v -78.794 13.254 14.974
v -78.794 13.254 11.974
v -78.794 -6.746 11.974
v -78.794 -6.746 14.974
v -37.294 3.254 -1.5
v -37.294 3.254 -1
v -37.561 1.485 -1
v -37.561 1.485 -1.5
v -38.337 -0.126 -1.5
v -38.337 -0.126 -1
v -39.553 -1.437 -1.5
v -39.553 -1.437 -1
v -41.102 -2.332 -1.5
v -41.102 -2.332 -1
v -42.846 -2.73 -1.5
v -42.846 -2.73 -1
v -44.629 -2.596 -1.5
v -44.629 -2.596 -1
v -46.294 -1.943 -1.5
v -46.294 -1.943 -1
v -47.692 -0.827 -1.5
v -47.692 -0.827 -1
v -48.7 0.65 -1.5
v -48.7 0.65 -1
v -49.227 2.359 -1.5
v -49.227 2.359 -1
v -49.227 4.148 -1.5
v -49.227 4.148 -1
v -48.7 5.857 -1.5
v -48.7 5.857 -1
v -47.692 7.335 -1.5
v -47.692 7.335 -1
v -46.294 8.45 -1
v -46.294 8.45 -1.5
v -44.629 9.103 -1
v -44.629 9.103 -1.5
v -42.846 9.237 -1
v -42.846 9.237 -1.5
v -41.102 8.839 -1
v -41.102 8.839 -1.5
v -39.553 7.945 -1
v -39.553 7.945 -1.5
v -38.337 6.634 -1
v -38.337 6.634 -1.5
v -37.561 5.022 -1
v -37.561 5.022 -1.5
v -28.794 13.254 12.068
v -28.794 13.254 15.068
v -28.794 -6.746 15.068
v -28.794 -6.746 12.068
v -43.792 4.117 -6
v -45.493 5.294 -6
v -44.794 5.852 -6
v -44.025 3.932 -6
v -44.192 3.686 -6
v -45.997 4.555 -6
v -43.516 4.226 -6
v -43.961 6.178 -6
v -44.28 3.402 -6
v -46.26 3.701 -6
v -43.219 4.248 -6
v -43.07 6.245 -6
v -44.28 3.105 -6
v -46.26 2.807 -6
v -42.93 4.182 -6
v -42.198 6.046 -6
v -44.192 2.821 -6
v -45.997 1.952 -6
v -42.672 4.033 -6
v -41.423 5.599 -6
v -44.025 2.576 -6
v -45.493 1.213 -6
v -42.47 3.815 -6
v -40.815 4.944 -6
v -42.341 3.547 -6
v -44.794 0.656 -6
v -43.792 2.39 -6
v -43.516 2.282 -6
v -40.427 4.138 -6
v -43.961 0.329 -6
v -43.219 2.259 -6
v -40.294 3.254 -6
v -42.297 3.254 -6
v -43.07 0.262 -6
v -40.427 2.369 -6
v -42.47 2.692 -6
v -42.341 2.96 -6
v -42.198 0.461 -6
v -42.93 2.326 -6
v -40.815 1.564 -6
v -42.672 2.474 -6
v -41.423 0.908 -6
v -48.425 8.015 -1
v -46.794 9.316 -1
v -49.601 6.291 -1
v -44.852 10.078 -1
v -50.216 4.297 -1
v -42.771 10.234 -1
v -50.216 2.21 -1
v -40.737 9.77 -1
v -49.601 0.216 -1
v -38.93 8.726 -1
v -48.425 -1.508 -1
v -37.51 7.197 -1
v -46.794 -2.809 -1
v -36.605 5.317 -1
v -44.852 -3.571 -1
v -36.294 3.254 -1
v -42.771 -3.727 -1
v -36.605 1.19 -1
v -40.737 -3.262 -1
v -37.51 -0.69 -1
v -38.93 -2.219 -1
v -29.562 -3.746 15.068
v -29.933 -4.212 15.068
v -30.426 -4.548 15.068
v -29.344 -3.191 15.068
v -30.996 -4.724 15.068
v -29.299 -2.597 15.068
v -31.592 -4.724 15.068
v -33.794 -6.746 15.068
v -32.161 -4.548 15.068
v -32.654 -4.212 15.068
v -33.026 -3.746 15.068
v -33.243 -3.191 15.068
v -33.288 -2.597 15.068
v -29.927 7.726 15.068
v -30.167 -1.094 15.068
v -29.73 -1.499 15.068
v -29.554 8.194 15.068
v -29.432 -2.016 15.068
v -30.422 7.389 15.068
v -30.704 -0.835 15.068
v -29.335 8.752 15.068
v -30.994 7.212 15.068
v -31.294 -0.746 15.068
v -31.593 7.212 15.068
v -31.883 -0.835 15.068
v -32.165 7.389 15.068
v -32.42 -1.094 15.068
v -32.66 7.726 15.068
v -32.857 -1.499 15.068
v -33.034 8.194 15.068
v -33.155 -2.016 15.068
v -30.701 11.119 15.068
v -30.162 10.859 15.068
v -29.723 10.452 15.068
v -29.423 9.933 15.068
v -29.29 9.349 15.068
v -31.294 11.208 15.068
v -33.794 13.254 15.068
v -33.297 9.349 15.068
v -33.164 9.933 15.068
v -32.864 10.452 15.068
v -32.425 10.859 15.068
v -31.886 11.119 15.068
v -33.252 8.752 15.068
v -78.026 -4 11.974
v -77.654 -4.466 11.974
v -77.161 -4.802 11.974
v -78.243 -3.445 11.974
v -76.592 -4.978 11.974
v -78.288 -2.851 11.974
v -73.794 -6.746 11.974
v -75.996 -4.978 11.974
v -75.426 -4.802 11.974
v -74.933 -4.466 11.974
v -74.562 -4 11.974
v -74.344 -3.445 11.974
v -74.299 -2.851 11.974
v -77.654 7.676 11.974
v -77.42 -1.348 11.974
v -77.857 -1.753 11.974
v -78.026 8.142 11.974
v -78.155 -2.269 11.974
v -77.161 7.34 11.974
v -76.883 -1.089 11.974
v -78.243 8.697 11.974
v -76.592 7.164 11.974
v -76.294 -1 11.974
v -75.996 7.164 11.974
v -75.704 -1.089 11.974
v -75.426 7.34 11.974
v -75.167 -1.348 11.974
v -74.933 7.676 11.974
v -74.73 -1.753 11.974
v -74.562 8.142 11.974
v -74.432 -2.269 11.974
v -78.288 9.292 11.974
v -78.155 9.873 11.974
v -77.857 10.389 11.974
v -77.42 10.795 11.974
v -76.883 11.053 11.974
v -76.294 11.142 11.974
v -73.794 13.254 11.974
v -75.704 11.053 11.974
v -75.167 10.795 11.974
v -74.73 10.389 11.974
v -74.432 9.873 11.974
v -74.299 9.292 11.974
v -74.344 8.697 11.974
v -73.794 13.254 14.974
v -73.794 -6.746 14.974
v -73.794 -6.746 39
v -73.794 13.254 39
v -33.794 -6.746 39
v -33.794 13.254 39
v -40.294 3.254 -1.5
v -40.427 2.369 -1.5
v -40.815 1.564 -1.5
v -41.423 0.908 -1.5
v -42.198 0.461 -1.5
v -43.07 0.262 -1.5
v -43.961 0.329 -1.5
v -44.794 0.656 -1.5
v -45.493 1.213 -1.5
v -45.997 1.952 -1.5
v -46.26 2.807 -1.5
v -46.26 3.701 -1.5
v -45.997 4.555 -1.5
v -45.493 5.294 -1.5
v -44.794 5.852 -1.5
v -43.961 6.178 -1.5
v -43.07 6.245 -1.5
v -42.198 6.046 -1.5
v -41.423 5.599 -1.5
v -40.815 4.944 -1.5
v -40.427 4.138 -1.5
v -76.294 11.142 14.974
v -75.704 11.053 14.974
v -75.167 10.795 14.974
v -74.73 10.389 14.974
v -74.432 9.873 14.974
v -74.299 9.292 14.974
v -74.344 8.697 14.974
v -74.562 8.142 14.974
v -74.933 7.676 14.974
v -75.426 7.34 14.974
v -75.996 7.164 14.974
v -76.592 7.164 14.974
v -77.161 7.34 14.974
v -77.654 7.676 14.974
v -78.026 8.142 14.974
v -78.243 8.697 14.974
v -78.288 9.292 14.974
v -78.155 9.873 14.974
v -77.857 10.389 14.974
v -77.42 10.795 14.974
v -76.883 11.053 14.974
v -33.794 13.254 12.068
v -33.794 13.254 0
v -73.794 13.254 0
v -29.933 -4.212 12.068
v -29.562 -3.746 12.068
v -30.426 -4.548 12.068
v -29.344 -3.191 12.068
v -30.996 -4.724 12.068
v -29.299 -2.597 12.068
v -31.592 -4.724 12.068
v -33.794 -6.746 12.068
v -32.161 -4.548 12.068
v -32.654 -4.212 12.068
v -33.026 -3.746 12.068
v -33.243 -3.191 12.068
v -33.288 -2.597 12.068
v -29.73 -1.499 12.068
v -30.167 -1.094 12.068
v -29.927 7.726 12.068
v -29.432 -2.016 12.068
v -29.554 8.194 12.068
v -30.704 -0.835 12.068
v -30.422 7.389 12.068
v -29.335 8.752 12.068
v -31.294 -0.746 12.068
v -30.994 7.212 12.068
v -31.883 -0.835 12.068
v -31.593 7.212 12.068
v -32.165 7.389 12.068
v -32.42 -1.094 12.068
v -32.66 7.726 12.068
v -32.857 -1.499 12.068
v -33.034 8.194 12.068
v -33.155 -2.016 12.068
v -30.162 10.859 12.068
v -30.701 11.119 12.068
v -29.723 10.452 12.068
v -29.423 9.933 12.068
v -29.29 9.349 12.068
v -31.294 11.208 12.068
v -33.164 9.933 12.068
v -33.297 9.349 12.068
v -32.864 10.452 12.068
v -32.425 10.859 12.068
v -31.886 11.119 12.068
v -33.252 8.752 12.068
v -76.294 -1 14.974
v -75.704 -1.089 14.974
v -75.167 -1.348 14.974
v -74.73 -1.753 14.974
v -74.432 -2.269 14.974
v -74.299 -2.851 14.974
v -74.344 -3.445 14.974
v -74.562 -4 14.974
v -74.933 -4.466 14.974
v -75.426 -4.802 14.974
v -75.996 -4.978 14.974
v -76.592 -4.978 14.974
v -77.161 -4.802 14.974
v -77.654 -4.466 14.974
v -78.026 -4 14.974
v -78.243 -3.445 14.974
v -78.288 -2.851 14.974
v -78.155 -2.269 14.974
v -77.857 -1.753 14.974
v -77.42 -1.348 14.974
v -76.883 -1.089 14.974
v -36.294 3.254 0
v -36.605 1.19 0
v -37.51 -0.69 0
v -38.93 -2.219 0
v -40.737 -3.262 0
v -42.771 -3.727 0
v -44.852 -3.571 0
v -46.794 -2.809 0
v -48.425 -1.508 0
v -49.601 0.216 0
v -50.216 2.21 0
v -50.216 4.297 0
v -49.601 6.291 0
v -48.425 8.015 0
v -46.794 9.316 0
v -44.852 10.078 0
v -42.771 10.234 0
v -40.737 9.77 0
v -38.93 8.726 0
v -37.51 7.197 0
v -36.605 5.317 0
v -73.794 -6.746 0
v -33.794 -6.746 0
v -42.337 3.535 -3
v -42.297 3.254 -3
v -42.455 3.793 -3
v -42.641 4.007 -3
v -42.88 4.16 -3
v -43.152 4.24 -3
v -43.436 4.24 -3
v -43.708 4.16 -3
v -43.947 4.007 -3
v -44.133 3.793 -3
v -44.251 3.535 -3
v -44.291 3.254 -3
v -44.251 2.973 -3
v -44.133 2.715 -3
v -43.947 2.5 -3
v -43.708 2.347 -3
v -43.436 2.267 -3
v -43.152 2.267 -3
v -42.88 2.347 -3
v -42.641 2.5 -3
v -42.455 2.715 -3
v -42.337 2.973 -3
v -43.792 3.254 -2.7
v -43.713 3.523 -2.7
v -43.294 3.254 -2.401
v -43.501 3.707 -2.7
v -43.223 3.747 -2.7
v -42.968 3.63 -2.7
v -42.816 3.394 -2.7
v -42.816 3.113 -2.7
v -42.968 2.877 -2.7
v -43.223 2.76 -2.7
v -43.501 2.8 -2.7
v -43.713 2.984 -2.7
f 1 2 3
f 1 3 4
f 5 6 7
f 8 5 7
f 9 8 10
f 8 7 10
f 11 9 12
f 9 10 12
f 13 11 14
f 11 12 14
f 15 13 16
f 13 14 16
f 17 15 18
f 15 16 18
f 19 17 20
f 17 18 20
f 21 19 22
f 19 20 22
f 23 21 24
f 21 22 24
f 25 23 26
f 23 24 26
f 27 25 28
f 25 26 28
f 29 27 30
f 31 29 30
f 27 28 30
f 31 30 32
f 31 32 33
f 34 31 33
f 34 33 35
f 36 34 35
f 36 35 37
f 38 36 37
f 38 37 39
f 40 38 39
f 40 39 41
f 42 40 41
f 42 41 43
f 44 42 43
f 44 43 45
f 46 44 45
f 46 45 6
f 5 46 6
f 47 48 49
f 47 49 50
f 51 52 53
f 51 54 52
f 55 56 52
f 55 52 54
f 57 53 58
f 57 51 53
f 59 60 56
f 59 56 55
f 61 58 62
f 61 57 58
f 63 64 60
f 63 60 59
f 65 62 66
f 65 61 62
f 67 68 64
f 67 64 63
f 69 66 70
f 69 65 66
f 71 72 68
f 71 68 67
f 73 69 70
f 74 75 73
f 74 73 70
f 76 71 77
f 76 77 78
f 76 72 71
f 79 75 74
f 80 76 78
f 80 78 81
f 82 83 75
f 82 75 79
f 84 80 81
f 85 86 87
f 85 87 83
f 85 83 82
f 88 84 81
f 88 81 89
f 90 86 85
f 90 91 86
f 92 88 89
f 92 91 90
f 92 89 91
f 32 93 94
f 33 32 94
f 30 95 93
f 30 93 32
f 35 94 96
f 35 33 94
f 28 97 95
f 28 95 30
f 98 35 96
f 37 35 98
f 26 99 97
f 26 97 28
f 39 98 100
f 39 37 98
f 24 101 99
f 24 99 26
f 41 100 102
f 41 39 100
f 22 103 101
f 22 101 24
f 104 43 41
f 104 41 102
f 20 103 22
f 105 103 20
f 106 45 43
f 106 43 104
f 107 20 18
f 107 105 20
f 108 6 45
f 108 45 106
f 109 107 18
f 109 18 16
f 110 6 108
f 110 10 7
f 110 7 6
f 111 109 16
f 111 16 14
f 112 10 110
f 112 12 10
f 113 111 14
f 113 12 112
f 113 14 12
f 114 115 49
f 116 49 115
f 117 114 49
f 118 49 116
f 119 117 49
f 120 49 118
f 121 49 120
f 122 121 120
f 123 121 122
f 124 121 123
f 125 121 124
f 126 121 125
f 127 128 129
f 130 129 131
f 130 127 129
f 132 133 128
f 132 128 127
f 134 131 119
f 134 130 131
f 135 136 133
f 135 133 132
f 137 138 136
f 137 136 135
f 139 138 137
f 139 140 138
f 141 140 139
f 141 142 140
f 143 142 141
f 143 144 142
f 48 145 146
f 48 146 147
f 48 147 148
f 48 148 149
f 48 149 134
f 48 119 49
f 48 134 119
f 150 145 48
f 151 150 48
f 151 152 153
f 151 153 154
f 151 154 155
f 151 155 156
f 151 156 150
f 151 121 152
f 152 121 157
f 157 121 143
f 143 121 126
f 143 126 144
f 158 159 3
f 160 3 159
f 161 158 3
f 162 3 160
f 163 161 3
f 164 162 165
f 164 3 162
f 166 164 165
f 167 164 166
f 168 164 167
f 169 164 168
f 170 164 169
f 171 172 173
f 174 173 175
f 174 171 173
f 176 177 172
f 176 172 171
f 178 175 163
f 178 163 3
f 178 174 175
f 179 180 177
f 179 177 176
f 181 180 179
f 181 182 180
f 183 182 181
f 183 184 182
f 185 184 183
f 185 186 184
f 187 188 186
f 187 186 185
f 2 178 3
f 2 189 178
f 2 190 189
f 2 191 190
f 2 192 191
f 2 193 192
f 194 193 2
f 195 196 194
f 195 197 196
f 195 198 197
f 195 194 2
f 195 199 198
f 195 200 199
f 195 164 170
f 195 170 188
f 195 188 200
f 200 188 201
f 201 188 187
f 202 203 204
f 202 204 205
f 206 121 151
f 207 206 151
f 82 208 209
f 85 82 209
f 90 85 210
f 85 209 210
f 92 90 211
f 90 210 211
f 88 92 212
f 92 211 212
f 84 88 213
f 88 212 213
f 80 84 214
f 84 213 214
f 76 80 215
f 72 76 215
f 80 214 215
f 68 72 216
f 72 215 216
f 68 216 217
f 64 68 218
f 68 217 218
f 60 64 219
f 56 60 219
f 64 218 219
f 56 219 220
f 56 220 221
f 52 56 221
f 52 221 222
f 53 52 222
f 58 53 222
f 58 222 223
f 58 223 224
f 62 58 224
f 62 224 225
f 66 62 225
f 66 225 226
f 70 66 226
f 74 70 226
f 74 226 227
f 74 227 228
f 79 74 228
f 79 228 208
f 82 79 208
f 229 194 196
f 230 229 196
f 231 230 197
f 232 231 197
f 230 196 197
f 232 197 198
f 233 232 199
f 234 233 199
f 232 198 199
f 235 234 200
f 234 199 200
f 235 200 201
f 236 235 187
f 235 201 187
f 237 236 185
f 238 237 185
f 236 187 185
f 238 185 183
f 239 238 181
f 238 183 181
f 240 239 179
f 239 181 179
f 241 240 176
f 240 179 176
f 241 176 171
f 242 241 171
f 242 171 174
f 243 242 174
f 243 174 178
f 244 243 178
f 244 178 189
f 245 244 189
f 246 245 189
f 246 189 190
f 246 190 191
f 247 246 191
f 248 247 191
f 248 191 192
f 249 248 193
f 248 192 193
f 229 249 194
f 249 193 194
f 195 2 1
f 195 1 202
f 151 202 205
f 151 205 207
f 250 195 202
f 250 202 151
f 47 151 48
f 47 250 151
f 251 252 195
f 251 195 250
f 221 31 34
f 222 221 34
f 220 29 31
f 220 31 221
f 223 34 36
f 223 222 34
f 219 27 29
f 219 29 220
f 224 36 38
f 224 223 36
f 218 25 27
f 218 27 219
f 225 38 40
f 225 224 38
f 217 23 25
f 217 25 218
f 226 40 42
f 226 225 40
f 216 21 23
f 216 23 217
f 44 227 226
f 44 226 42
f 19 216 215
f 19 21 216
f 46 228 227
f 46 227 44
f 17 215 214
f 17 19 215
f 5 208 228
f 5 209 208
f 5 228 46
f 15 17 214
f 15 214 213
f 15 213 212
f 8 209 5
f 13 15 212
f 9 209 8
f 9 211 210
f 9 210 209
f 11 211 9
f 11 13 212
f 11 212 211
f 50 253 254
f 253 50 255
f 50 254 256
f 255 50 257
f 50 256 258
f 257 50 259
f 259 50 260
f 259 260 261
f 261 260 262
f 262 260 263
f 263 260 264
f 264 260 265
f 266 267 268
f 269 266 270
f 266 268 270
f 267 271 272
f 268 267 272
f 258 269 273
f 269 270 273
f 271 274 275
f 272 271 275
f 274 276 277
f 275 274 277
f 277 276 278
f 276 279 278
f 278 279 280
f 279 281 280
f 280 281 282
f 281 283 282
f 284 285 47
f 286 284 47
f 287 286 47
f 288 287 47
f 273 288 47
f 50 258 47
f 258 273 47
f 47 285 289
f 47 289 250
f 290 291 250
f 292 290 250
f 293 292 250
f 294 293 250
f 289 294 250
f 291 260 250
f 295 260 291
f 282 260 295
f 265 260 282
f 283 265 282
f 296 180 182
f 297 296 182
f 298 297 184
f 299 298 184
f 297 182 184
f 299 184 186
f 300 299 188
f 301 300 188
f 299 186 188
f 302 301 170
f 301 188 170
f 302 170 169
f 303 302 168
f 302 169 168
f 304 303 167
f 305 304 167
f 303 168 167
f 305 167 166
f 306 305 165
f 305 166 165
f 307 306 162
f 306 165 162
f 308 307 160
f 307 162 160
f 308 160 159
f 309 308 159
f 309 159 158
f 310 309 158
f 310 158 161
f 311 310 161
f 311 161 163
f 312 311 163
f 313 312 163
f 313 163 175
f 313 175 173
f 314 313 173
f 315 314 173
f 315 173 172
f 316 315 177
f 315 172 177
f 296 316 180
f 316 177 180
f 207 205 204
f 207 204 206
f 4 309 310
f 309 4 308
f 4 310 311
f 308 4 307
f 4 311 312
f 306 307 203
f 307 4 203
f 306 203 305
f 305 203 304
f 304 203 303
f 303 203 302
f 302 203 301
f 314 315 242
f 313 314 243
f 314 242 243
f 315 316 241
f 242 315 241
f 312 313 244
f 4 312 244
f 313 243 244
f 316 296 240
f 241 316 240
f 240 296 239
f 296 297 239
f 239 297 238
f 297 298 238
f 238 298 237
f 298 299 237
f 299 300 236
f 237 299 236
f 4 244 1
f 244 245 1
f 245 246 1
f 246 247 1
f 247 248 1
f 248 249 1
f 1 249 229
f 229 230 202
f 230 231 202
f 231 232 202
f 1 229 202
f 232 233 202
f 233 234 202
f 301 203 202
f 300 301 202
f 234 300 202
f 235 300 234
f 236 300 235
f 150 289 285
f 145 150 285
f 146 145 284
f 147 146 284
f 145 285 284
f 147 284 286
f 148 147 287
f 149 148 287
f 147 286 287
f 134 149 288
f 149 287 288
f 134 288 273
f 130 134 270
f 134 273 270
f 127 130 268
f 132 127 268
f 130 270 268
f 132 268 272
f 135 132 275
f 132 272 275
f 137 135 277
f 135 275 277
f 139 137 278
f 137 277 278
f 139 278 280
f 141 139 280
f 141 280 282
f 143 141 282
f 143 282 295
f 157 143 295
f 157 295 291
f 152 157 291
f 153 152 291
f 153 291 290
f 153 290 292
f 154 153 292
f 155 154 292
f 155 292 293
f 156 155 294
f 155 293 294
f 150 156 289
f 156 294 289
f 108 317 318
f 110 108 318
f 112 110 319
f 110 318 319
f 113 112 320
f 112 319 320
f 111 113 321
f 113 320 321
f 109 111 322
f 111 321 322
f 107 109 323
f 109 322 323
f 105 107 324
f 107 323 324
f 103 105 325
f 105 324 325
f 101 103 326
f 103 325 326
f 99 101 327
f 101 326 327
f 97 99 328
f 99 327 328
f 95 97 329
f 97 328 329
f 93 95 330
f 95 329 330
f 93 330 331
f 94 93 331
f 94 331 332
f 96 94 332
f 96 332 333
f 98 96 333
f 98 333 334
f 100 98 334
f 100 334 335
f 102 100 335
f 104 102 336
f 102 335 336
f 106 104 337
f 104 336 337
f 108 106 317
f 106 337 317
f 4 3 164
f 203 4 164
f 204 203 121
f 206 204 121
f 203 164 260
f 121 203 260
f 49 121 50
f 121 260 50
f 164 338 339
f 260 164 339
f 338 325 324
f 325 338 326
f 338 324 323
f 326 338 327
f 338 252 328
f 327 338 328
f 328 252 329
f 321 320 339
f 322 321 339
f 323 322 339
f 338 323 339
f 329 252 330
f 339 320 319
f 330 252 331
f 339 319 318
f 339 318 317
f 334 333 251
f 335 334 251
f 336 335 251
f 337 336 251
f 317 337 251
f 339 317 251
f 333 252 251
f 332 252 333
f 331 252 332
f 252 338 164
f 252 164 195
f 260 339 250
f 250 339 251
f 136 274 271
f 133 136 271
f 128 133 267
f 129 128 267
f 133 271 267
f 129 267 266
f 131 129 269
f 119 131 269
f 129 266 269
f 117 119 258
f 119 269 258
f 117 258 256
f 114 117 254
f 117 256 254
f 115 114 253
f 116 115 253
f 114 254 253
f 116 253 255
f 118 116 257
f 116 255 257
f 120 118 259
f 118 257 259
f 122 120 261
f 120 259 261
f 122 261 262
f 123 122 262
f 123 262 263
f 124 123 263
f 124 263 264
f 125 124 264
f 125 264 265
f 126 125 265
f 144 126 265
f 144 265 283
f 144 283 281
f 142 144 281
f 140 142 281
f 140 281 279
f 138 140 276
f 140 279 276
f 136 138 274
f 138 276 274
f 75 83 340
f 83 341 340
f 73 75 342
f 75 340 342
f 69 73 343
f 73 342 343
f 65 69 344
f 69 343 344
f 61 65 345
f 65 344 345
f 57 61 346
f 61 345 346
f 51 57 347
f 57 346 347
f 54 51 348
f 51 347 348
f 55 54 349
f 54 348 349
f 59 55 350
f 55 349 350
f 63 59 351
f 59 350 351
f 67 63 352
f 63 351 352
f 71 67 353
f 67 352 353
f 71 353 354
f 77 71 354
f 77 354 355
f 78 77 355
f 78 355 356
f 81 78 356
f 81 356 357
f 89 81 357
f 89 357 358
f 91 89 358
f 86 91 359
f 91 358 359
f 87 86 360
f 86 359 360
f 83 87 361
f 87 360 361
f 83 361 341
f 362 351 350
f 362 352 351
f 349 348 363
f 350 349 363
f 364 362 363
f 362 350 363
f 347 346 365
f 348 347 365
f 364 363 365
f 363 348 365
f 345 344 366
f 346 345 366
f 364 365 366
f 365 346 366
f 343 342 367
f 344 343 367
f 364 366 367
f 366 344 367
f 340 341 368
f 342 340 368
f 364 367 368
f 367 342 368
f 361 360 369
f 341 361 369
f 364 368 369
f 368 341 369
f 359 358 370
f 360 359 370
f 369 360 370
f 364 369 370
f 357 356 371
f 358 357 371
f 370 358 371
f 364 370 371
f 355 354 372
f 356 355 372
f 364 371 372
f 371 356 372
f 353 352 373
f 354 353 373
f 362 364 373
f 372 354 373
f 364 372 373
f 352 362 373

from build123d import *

# Parameters (mm, degrees)
SKETCH_3_W               = 40
SKETCH_3_H               = 20
EXTRUDE_2_DEPTH          = 39
SKETCH_4_W               = 3
SKETCH_4_H               = 20
EXTRUDE_3_DEPTH          = 5
SKETCH_7_W               = 3
SKETCH_7_H               = 20
EXTRUDE_4_DEPTH          = 5
SKETCH_9_R               = 2
CUT_EXTRUDE_1_DEPTH      = 3
SKETCH_10_R              = 2.009071102
SKETCH_10_R_2            = 2
CUT_EXTRUDE_2_DEPTH      = 3
SKETCH_11_R              = 3
EXTRUDE_6_DEPTH          = 6
SKETCH_16_R              = 6
EXTRUDE_8_DEPTH          = 1.5
SKETCH_17_R              = 7
EXTRUDE_9_DEPTH          = 1
HOLE_WIZARD_3_48_1_D     = 1.9939
HOLE_WIZARD_3_48_1_DEPTH = 3
HOLE_WIZARD_3_48_1_TIP   = 0.599027994


with BuildPart() as part:
    # 草图3 → 凸台-拉伸2 (new body)
    with BuildSketch(Plane.XY):
        with Locations((-53.793598947, 3.253632602)):
            Rectangle(SKETCH_3_W, SKETCH_3_H)
    extrude(amount=EXTRUDE_2_DEPTH)

    # 草图4 → 凸台-拉伸3 (add)
    with BuildSketch(Plane(origin=(-33.793598947, 0, 0), x_dir=(0, 0, -1), z_dir=(1, 0, 0))):
        with Locations((-13.568387962, 3.253632602)):
            Rectangle(SKETCH_4_W, SKETCH_4_H)
    extrude(amount=EXTRUDE_3_DEPTH)

    # 草图7 → 凸台-拉伸4 (add)
    with BuildSketch(Plane.ZY.offset(73.793598947)):
        with Locations((13.473660247, 3.253632602)):
            Rectangle(SKETCH_7_W, SKETCH_7_H)
    extrude(amount=EXTRUDE_4_DEPTH)

    # 草图9 → 切除-拉伸1 (cut)
    with BuildSketch(Plane(origin=(0, 0, 11.973660247), x_dir=(-1, 0, 0), z_dir=(0, 0, -1))):
        with Locations(Location((76.293598947, 9.142056697, 0), (0, 0, 90))):
            Circle(SKETCH_9_R)
        with Locations(Location((76.293598947, -3, 0), (0, 0, 90))):
            Circle(SKETCH_9_R)
    extrude(amount=-CUT_EXTRUDE_1_DEPTH, mode=Mode.SUBTRACT)

    # 草图10 → 切除-拉伸2 (cut)
    with BuildSketch(Plane(origin=(0, 0, 12.068387962), x_dir=(-1, 0, 0), z_dir=(0, 0, -1))):
        with Locations(Location((31.293598947, 9.199024835, 0), (0, 0, 90))):
            Circle(SKETCH_10_R)
        with Locations(Location((31.293598947, -2.746367398, 0), (0, 0, 90))):
            Circle(SKETCH_10_R_2)
    extrude(amount=-CUT_EXTRUDE_2_DEPTH, mode=Mode.SUBTRACT)

    # 草图11 → 凸台-拉伸6 (add)
    with BuildSketch(Plane(origin=(0, 0, 0), x_dir=(-1, 0, 0), z_dir=(0, 0, -1))):
        with Locations(Location((43.293936899, 3.253632602, 0), (0, 0, 180))):
            Circle(SKETCH_11_R)
    extrude(amount=EXTRUDE_6_DEPTH)

    # 草图16 → 凸台-拉伸8 (add)
    with BuildSketch(Plane(origin=(0, 0, 0), x_dir=(-1, 0, 0), z_dir=(0, 0, -1))):
        with Locations(Location((43.293936899, 3.253632602, 0), (0, 0, 180))):
            Circle(SKETCH_16_R)
    extrude(amount=EXTRUDE_8_DEPTH)

    # 草图17 → 凸台-拉伸9 (add)
    with BuildSketch(Plane(origin=(0, 0, 0), x_dir=(-1, 0, 0), z_dir=(0, 0, -1))):
        with Locations(Location((43.293936899, 3.253632602, 0), (0, 0, 180))):
            Circle(SKETCH_17_R)
    extrude(amount=EXTRUDE_9_DEPTH)

    # #3-48 螺纹孔的螺纹孔钻头1
    with Locations(Plane(origin=(0, 0, -6), x_dir=(-1, 0, 0), z_dir=(0, 0, -1))):
        with Locations((43.293936899, 3.253632602)):
            Hole(HOLE_WIZARD_3_48_1_D / 2, depth=HOLE_WIZARD_3_48_1_DEPTH)
            with Locations((0, 0, -(HOLE_WIZARD_3_48_1_DEPTH + HOLE_WIZARD_3_48_1_TIP / 2))):  # 118° drill point
                Cone(0, HOLE_WIZARD_3_48_1_D / 2, HOLE_WIZARD_3_48_1_TIP, mode=Mode.SUBTRACT)


solid = part.part
